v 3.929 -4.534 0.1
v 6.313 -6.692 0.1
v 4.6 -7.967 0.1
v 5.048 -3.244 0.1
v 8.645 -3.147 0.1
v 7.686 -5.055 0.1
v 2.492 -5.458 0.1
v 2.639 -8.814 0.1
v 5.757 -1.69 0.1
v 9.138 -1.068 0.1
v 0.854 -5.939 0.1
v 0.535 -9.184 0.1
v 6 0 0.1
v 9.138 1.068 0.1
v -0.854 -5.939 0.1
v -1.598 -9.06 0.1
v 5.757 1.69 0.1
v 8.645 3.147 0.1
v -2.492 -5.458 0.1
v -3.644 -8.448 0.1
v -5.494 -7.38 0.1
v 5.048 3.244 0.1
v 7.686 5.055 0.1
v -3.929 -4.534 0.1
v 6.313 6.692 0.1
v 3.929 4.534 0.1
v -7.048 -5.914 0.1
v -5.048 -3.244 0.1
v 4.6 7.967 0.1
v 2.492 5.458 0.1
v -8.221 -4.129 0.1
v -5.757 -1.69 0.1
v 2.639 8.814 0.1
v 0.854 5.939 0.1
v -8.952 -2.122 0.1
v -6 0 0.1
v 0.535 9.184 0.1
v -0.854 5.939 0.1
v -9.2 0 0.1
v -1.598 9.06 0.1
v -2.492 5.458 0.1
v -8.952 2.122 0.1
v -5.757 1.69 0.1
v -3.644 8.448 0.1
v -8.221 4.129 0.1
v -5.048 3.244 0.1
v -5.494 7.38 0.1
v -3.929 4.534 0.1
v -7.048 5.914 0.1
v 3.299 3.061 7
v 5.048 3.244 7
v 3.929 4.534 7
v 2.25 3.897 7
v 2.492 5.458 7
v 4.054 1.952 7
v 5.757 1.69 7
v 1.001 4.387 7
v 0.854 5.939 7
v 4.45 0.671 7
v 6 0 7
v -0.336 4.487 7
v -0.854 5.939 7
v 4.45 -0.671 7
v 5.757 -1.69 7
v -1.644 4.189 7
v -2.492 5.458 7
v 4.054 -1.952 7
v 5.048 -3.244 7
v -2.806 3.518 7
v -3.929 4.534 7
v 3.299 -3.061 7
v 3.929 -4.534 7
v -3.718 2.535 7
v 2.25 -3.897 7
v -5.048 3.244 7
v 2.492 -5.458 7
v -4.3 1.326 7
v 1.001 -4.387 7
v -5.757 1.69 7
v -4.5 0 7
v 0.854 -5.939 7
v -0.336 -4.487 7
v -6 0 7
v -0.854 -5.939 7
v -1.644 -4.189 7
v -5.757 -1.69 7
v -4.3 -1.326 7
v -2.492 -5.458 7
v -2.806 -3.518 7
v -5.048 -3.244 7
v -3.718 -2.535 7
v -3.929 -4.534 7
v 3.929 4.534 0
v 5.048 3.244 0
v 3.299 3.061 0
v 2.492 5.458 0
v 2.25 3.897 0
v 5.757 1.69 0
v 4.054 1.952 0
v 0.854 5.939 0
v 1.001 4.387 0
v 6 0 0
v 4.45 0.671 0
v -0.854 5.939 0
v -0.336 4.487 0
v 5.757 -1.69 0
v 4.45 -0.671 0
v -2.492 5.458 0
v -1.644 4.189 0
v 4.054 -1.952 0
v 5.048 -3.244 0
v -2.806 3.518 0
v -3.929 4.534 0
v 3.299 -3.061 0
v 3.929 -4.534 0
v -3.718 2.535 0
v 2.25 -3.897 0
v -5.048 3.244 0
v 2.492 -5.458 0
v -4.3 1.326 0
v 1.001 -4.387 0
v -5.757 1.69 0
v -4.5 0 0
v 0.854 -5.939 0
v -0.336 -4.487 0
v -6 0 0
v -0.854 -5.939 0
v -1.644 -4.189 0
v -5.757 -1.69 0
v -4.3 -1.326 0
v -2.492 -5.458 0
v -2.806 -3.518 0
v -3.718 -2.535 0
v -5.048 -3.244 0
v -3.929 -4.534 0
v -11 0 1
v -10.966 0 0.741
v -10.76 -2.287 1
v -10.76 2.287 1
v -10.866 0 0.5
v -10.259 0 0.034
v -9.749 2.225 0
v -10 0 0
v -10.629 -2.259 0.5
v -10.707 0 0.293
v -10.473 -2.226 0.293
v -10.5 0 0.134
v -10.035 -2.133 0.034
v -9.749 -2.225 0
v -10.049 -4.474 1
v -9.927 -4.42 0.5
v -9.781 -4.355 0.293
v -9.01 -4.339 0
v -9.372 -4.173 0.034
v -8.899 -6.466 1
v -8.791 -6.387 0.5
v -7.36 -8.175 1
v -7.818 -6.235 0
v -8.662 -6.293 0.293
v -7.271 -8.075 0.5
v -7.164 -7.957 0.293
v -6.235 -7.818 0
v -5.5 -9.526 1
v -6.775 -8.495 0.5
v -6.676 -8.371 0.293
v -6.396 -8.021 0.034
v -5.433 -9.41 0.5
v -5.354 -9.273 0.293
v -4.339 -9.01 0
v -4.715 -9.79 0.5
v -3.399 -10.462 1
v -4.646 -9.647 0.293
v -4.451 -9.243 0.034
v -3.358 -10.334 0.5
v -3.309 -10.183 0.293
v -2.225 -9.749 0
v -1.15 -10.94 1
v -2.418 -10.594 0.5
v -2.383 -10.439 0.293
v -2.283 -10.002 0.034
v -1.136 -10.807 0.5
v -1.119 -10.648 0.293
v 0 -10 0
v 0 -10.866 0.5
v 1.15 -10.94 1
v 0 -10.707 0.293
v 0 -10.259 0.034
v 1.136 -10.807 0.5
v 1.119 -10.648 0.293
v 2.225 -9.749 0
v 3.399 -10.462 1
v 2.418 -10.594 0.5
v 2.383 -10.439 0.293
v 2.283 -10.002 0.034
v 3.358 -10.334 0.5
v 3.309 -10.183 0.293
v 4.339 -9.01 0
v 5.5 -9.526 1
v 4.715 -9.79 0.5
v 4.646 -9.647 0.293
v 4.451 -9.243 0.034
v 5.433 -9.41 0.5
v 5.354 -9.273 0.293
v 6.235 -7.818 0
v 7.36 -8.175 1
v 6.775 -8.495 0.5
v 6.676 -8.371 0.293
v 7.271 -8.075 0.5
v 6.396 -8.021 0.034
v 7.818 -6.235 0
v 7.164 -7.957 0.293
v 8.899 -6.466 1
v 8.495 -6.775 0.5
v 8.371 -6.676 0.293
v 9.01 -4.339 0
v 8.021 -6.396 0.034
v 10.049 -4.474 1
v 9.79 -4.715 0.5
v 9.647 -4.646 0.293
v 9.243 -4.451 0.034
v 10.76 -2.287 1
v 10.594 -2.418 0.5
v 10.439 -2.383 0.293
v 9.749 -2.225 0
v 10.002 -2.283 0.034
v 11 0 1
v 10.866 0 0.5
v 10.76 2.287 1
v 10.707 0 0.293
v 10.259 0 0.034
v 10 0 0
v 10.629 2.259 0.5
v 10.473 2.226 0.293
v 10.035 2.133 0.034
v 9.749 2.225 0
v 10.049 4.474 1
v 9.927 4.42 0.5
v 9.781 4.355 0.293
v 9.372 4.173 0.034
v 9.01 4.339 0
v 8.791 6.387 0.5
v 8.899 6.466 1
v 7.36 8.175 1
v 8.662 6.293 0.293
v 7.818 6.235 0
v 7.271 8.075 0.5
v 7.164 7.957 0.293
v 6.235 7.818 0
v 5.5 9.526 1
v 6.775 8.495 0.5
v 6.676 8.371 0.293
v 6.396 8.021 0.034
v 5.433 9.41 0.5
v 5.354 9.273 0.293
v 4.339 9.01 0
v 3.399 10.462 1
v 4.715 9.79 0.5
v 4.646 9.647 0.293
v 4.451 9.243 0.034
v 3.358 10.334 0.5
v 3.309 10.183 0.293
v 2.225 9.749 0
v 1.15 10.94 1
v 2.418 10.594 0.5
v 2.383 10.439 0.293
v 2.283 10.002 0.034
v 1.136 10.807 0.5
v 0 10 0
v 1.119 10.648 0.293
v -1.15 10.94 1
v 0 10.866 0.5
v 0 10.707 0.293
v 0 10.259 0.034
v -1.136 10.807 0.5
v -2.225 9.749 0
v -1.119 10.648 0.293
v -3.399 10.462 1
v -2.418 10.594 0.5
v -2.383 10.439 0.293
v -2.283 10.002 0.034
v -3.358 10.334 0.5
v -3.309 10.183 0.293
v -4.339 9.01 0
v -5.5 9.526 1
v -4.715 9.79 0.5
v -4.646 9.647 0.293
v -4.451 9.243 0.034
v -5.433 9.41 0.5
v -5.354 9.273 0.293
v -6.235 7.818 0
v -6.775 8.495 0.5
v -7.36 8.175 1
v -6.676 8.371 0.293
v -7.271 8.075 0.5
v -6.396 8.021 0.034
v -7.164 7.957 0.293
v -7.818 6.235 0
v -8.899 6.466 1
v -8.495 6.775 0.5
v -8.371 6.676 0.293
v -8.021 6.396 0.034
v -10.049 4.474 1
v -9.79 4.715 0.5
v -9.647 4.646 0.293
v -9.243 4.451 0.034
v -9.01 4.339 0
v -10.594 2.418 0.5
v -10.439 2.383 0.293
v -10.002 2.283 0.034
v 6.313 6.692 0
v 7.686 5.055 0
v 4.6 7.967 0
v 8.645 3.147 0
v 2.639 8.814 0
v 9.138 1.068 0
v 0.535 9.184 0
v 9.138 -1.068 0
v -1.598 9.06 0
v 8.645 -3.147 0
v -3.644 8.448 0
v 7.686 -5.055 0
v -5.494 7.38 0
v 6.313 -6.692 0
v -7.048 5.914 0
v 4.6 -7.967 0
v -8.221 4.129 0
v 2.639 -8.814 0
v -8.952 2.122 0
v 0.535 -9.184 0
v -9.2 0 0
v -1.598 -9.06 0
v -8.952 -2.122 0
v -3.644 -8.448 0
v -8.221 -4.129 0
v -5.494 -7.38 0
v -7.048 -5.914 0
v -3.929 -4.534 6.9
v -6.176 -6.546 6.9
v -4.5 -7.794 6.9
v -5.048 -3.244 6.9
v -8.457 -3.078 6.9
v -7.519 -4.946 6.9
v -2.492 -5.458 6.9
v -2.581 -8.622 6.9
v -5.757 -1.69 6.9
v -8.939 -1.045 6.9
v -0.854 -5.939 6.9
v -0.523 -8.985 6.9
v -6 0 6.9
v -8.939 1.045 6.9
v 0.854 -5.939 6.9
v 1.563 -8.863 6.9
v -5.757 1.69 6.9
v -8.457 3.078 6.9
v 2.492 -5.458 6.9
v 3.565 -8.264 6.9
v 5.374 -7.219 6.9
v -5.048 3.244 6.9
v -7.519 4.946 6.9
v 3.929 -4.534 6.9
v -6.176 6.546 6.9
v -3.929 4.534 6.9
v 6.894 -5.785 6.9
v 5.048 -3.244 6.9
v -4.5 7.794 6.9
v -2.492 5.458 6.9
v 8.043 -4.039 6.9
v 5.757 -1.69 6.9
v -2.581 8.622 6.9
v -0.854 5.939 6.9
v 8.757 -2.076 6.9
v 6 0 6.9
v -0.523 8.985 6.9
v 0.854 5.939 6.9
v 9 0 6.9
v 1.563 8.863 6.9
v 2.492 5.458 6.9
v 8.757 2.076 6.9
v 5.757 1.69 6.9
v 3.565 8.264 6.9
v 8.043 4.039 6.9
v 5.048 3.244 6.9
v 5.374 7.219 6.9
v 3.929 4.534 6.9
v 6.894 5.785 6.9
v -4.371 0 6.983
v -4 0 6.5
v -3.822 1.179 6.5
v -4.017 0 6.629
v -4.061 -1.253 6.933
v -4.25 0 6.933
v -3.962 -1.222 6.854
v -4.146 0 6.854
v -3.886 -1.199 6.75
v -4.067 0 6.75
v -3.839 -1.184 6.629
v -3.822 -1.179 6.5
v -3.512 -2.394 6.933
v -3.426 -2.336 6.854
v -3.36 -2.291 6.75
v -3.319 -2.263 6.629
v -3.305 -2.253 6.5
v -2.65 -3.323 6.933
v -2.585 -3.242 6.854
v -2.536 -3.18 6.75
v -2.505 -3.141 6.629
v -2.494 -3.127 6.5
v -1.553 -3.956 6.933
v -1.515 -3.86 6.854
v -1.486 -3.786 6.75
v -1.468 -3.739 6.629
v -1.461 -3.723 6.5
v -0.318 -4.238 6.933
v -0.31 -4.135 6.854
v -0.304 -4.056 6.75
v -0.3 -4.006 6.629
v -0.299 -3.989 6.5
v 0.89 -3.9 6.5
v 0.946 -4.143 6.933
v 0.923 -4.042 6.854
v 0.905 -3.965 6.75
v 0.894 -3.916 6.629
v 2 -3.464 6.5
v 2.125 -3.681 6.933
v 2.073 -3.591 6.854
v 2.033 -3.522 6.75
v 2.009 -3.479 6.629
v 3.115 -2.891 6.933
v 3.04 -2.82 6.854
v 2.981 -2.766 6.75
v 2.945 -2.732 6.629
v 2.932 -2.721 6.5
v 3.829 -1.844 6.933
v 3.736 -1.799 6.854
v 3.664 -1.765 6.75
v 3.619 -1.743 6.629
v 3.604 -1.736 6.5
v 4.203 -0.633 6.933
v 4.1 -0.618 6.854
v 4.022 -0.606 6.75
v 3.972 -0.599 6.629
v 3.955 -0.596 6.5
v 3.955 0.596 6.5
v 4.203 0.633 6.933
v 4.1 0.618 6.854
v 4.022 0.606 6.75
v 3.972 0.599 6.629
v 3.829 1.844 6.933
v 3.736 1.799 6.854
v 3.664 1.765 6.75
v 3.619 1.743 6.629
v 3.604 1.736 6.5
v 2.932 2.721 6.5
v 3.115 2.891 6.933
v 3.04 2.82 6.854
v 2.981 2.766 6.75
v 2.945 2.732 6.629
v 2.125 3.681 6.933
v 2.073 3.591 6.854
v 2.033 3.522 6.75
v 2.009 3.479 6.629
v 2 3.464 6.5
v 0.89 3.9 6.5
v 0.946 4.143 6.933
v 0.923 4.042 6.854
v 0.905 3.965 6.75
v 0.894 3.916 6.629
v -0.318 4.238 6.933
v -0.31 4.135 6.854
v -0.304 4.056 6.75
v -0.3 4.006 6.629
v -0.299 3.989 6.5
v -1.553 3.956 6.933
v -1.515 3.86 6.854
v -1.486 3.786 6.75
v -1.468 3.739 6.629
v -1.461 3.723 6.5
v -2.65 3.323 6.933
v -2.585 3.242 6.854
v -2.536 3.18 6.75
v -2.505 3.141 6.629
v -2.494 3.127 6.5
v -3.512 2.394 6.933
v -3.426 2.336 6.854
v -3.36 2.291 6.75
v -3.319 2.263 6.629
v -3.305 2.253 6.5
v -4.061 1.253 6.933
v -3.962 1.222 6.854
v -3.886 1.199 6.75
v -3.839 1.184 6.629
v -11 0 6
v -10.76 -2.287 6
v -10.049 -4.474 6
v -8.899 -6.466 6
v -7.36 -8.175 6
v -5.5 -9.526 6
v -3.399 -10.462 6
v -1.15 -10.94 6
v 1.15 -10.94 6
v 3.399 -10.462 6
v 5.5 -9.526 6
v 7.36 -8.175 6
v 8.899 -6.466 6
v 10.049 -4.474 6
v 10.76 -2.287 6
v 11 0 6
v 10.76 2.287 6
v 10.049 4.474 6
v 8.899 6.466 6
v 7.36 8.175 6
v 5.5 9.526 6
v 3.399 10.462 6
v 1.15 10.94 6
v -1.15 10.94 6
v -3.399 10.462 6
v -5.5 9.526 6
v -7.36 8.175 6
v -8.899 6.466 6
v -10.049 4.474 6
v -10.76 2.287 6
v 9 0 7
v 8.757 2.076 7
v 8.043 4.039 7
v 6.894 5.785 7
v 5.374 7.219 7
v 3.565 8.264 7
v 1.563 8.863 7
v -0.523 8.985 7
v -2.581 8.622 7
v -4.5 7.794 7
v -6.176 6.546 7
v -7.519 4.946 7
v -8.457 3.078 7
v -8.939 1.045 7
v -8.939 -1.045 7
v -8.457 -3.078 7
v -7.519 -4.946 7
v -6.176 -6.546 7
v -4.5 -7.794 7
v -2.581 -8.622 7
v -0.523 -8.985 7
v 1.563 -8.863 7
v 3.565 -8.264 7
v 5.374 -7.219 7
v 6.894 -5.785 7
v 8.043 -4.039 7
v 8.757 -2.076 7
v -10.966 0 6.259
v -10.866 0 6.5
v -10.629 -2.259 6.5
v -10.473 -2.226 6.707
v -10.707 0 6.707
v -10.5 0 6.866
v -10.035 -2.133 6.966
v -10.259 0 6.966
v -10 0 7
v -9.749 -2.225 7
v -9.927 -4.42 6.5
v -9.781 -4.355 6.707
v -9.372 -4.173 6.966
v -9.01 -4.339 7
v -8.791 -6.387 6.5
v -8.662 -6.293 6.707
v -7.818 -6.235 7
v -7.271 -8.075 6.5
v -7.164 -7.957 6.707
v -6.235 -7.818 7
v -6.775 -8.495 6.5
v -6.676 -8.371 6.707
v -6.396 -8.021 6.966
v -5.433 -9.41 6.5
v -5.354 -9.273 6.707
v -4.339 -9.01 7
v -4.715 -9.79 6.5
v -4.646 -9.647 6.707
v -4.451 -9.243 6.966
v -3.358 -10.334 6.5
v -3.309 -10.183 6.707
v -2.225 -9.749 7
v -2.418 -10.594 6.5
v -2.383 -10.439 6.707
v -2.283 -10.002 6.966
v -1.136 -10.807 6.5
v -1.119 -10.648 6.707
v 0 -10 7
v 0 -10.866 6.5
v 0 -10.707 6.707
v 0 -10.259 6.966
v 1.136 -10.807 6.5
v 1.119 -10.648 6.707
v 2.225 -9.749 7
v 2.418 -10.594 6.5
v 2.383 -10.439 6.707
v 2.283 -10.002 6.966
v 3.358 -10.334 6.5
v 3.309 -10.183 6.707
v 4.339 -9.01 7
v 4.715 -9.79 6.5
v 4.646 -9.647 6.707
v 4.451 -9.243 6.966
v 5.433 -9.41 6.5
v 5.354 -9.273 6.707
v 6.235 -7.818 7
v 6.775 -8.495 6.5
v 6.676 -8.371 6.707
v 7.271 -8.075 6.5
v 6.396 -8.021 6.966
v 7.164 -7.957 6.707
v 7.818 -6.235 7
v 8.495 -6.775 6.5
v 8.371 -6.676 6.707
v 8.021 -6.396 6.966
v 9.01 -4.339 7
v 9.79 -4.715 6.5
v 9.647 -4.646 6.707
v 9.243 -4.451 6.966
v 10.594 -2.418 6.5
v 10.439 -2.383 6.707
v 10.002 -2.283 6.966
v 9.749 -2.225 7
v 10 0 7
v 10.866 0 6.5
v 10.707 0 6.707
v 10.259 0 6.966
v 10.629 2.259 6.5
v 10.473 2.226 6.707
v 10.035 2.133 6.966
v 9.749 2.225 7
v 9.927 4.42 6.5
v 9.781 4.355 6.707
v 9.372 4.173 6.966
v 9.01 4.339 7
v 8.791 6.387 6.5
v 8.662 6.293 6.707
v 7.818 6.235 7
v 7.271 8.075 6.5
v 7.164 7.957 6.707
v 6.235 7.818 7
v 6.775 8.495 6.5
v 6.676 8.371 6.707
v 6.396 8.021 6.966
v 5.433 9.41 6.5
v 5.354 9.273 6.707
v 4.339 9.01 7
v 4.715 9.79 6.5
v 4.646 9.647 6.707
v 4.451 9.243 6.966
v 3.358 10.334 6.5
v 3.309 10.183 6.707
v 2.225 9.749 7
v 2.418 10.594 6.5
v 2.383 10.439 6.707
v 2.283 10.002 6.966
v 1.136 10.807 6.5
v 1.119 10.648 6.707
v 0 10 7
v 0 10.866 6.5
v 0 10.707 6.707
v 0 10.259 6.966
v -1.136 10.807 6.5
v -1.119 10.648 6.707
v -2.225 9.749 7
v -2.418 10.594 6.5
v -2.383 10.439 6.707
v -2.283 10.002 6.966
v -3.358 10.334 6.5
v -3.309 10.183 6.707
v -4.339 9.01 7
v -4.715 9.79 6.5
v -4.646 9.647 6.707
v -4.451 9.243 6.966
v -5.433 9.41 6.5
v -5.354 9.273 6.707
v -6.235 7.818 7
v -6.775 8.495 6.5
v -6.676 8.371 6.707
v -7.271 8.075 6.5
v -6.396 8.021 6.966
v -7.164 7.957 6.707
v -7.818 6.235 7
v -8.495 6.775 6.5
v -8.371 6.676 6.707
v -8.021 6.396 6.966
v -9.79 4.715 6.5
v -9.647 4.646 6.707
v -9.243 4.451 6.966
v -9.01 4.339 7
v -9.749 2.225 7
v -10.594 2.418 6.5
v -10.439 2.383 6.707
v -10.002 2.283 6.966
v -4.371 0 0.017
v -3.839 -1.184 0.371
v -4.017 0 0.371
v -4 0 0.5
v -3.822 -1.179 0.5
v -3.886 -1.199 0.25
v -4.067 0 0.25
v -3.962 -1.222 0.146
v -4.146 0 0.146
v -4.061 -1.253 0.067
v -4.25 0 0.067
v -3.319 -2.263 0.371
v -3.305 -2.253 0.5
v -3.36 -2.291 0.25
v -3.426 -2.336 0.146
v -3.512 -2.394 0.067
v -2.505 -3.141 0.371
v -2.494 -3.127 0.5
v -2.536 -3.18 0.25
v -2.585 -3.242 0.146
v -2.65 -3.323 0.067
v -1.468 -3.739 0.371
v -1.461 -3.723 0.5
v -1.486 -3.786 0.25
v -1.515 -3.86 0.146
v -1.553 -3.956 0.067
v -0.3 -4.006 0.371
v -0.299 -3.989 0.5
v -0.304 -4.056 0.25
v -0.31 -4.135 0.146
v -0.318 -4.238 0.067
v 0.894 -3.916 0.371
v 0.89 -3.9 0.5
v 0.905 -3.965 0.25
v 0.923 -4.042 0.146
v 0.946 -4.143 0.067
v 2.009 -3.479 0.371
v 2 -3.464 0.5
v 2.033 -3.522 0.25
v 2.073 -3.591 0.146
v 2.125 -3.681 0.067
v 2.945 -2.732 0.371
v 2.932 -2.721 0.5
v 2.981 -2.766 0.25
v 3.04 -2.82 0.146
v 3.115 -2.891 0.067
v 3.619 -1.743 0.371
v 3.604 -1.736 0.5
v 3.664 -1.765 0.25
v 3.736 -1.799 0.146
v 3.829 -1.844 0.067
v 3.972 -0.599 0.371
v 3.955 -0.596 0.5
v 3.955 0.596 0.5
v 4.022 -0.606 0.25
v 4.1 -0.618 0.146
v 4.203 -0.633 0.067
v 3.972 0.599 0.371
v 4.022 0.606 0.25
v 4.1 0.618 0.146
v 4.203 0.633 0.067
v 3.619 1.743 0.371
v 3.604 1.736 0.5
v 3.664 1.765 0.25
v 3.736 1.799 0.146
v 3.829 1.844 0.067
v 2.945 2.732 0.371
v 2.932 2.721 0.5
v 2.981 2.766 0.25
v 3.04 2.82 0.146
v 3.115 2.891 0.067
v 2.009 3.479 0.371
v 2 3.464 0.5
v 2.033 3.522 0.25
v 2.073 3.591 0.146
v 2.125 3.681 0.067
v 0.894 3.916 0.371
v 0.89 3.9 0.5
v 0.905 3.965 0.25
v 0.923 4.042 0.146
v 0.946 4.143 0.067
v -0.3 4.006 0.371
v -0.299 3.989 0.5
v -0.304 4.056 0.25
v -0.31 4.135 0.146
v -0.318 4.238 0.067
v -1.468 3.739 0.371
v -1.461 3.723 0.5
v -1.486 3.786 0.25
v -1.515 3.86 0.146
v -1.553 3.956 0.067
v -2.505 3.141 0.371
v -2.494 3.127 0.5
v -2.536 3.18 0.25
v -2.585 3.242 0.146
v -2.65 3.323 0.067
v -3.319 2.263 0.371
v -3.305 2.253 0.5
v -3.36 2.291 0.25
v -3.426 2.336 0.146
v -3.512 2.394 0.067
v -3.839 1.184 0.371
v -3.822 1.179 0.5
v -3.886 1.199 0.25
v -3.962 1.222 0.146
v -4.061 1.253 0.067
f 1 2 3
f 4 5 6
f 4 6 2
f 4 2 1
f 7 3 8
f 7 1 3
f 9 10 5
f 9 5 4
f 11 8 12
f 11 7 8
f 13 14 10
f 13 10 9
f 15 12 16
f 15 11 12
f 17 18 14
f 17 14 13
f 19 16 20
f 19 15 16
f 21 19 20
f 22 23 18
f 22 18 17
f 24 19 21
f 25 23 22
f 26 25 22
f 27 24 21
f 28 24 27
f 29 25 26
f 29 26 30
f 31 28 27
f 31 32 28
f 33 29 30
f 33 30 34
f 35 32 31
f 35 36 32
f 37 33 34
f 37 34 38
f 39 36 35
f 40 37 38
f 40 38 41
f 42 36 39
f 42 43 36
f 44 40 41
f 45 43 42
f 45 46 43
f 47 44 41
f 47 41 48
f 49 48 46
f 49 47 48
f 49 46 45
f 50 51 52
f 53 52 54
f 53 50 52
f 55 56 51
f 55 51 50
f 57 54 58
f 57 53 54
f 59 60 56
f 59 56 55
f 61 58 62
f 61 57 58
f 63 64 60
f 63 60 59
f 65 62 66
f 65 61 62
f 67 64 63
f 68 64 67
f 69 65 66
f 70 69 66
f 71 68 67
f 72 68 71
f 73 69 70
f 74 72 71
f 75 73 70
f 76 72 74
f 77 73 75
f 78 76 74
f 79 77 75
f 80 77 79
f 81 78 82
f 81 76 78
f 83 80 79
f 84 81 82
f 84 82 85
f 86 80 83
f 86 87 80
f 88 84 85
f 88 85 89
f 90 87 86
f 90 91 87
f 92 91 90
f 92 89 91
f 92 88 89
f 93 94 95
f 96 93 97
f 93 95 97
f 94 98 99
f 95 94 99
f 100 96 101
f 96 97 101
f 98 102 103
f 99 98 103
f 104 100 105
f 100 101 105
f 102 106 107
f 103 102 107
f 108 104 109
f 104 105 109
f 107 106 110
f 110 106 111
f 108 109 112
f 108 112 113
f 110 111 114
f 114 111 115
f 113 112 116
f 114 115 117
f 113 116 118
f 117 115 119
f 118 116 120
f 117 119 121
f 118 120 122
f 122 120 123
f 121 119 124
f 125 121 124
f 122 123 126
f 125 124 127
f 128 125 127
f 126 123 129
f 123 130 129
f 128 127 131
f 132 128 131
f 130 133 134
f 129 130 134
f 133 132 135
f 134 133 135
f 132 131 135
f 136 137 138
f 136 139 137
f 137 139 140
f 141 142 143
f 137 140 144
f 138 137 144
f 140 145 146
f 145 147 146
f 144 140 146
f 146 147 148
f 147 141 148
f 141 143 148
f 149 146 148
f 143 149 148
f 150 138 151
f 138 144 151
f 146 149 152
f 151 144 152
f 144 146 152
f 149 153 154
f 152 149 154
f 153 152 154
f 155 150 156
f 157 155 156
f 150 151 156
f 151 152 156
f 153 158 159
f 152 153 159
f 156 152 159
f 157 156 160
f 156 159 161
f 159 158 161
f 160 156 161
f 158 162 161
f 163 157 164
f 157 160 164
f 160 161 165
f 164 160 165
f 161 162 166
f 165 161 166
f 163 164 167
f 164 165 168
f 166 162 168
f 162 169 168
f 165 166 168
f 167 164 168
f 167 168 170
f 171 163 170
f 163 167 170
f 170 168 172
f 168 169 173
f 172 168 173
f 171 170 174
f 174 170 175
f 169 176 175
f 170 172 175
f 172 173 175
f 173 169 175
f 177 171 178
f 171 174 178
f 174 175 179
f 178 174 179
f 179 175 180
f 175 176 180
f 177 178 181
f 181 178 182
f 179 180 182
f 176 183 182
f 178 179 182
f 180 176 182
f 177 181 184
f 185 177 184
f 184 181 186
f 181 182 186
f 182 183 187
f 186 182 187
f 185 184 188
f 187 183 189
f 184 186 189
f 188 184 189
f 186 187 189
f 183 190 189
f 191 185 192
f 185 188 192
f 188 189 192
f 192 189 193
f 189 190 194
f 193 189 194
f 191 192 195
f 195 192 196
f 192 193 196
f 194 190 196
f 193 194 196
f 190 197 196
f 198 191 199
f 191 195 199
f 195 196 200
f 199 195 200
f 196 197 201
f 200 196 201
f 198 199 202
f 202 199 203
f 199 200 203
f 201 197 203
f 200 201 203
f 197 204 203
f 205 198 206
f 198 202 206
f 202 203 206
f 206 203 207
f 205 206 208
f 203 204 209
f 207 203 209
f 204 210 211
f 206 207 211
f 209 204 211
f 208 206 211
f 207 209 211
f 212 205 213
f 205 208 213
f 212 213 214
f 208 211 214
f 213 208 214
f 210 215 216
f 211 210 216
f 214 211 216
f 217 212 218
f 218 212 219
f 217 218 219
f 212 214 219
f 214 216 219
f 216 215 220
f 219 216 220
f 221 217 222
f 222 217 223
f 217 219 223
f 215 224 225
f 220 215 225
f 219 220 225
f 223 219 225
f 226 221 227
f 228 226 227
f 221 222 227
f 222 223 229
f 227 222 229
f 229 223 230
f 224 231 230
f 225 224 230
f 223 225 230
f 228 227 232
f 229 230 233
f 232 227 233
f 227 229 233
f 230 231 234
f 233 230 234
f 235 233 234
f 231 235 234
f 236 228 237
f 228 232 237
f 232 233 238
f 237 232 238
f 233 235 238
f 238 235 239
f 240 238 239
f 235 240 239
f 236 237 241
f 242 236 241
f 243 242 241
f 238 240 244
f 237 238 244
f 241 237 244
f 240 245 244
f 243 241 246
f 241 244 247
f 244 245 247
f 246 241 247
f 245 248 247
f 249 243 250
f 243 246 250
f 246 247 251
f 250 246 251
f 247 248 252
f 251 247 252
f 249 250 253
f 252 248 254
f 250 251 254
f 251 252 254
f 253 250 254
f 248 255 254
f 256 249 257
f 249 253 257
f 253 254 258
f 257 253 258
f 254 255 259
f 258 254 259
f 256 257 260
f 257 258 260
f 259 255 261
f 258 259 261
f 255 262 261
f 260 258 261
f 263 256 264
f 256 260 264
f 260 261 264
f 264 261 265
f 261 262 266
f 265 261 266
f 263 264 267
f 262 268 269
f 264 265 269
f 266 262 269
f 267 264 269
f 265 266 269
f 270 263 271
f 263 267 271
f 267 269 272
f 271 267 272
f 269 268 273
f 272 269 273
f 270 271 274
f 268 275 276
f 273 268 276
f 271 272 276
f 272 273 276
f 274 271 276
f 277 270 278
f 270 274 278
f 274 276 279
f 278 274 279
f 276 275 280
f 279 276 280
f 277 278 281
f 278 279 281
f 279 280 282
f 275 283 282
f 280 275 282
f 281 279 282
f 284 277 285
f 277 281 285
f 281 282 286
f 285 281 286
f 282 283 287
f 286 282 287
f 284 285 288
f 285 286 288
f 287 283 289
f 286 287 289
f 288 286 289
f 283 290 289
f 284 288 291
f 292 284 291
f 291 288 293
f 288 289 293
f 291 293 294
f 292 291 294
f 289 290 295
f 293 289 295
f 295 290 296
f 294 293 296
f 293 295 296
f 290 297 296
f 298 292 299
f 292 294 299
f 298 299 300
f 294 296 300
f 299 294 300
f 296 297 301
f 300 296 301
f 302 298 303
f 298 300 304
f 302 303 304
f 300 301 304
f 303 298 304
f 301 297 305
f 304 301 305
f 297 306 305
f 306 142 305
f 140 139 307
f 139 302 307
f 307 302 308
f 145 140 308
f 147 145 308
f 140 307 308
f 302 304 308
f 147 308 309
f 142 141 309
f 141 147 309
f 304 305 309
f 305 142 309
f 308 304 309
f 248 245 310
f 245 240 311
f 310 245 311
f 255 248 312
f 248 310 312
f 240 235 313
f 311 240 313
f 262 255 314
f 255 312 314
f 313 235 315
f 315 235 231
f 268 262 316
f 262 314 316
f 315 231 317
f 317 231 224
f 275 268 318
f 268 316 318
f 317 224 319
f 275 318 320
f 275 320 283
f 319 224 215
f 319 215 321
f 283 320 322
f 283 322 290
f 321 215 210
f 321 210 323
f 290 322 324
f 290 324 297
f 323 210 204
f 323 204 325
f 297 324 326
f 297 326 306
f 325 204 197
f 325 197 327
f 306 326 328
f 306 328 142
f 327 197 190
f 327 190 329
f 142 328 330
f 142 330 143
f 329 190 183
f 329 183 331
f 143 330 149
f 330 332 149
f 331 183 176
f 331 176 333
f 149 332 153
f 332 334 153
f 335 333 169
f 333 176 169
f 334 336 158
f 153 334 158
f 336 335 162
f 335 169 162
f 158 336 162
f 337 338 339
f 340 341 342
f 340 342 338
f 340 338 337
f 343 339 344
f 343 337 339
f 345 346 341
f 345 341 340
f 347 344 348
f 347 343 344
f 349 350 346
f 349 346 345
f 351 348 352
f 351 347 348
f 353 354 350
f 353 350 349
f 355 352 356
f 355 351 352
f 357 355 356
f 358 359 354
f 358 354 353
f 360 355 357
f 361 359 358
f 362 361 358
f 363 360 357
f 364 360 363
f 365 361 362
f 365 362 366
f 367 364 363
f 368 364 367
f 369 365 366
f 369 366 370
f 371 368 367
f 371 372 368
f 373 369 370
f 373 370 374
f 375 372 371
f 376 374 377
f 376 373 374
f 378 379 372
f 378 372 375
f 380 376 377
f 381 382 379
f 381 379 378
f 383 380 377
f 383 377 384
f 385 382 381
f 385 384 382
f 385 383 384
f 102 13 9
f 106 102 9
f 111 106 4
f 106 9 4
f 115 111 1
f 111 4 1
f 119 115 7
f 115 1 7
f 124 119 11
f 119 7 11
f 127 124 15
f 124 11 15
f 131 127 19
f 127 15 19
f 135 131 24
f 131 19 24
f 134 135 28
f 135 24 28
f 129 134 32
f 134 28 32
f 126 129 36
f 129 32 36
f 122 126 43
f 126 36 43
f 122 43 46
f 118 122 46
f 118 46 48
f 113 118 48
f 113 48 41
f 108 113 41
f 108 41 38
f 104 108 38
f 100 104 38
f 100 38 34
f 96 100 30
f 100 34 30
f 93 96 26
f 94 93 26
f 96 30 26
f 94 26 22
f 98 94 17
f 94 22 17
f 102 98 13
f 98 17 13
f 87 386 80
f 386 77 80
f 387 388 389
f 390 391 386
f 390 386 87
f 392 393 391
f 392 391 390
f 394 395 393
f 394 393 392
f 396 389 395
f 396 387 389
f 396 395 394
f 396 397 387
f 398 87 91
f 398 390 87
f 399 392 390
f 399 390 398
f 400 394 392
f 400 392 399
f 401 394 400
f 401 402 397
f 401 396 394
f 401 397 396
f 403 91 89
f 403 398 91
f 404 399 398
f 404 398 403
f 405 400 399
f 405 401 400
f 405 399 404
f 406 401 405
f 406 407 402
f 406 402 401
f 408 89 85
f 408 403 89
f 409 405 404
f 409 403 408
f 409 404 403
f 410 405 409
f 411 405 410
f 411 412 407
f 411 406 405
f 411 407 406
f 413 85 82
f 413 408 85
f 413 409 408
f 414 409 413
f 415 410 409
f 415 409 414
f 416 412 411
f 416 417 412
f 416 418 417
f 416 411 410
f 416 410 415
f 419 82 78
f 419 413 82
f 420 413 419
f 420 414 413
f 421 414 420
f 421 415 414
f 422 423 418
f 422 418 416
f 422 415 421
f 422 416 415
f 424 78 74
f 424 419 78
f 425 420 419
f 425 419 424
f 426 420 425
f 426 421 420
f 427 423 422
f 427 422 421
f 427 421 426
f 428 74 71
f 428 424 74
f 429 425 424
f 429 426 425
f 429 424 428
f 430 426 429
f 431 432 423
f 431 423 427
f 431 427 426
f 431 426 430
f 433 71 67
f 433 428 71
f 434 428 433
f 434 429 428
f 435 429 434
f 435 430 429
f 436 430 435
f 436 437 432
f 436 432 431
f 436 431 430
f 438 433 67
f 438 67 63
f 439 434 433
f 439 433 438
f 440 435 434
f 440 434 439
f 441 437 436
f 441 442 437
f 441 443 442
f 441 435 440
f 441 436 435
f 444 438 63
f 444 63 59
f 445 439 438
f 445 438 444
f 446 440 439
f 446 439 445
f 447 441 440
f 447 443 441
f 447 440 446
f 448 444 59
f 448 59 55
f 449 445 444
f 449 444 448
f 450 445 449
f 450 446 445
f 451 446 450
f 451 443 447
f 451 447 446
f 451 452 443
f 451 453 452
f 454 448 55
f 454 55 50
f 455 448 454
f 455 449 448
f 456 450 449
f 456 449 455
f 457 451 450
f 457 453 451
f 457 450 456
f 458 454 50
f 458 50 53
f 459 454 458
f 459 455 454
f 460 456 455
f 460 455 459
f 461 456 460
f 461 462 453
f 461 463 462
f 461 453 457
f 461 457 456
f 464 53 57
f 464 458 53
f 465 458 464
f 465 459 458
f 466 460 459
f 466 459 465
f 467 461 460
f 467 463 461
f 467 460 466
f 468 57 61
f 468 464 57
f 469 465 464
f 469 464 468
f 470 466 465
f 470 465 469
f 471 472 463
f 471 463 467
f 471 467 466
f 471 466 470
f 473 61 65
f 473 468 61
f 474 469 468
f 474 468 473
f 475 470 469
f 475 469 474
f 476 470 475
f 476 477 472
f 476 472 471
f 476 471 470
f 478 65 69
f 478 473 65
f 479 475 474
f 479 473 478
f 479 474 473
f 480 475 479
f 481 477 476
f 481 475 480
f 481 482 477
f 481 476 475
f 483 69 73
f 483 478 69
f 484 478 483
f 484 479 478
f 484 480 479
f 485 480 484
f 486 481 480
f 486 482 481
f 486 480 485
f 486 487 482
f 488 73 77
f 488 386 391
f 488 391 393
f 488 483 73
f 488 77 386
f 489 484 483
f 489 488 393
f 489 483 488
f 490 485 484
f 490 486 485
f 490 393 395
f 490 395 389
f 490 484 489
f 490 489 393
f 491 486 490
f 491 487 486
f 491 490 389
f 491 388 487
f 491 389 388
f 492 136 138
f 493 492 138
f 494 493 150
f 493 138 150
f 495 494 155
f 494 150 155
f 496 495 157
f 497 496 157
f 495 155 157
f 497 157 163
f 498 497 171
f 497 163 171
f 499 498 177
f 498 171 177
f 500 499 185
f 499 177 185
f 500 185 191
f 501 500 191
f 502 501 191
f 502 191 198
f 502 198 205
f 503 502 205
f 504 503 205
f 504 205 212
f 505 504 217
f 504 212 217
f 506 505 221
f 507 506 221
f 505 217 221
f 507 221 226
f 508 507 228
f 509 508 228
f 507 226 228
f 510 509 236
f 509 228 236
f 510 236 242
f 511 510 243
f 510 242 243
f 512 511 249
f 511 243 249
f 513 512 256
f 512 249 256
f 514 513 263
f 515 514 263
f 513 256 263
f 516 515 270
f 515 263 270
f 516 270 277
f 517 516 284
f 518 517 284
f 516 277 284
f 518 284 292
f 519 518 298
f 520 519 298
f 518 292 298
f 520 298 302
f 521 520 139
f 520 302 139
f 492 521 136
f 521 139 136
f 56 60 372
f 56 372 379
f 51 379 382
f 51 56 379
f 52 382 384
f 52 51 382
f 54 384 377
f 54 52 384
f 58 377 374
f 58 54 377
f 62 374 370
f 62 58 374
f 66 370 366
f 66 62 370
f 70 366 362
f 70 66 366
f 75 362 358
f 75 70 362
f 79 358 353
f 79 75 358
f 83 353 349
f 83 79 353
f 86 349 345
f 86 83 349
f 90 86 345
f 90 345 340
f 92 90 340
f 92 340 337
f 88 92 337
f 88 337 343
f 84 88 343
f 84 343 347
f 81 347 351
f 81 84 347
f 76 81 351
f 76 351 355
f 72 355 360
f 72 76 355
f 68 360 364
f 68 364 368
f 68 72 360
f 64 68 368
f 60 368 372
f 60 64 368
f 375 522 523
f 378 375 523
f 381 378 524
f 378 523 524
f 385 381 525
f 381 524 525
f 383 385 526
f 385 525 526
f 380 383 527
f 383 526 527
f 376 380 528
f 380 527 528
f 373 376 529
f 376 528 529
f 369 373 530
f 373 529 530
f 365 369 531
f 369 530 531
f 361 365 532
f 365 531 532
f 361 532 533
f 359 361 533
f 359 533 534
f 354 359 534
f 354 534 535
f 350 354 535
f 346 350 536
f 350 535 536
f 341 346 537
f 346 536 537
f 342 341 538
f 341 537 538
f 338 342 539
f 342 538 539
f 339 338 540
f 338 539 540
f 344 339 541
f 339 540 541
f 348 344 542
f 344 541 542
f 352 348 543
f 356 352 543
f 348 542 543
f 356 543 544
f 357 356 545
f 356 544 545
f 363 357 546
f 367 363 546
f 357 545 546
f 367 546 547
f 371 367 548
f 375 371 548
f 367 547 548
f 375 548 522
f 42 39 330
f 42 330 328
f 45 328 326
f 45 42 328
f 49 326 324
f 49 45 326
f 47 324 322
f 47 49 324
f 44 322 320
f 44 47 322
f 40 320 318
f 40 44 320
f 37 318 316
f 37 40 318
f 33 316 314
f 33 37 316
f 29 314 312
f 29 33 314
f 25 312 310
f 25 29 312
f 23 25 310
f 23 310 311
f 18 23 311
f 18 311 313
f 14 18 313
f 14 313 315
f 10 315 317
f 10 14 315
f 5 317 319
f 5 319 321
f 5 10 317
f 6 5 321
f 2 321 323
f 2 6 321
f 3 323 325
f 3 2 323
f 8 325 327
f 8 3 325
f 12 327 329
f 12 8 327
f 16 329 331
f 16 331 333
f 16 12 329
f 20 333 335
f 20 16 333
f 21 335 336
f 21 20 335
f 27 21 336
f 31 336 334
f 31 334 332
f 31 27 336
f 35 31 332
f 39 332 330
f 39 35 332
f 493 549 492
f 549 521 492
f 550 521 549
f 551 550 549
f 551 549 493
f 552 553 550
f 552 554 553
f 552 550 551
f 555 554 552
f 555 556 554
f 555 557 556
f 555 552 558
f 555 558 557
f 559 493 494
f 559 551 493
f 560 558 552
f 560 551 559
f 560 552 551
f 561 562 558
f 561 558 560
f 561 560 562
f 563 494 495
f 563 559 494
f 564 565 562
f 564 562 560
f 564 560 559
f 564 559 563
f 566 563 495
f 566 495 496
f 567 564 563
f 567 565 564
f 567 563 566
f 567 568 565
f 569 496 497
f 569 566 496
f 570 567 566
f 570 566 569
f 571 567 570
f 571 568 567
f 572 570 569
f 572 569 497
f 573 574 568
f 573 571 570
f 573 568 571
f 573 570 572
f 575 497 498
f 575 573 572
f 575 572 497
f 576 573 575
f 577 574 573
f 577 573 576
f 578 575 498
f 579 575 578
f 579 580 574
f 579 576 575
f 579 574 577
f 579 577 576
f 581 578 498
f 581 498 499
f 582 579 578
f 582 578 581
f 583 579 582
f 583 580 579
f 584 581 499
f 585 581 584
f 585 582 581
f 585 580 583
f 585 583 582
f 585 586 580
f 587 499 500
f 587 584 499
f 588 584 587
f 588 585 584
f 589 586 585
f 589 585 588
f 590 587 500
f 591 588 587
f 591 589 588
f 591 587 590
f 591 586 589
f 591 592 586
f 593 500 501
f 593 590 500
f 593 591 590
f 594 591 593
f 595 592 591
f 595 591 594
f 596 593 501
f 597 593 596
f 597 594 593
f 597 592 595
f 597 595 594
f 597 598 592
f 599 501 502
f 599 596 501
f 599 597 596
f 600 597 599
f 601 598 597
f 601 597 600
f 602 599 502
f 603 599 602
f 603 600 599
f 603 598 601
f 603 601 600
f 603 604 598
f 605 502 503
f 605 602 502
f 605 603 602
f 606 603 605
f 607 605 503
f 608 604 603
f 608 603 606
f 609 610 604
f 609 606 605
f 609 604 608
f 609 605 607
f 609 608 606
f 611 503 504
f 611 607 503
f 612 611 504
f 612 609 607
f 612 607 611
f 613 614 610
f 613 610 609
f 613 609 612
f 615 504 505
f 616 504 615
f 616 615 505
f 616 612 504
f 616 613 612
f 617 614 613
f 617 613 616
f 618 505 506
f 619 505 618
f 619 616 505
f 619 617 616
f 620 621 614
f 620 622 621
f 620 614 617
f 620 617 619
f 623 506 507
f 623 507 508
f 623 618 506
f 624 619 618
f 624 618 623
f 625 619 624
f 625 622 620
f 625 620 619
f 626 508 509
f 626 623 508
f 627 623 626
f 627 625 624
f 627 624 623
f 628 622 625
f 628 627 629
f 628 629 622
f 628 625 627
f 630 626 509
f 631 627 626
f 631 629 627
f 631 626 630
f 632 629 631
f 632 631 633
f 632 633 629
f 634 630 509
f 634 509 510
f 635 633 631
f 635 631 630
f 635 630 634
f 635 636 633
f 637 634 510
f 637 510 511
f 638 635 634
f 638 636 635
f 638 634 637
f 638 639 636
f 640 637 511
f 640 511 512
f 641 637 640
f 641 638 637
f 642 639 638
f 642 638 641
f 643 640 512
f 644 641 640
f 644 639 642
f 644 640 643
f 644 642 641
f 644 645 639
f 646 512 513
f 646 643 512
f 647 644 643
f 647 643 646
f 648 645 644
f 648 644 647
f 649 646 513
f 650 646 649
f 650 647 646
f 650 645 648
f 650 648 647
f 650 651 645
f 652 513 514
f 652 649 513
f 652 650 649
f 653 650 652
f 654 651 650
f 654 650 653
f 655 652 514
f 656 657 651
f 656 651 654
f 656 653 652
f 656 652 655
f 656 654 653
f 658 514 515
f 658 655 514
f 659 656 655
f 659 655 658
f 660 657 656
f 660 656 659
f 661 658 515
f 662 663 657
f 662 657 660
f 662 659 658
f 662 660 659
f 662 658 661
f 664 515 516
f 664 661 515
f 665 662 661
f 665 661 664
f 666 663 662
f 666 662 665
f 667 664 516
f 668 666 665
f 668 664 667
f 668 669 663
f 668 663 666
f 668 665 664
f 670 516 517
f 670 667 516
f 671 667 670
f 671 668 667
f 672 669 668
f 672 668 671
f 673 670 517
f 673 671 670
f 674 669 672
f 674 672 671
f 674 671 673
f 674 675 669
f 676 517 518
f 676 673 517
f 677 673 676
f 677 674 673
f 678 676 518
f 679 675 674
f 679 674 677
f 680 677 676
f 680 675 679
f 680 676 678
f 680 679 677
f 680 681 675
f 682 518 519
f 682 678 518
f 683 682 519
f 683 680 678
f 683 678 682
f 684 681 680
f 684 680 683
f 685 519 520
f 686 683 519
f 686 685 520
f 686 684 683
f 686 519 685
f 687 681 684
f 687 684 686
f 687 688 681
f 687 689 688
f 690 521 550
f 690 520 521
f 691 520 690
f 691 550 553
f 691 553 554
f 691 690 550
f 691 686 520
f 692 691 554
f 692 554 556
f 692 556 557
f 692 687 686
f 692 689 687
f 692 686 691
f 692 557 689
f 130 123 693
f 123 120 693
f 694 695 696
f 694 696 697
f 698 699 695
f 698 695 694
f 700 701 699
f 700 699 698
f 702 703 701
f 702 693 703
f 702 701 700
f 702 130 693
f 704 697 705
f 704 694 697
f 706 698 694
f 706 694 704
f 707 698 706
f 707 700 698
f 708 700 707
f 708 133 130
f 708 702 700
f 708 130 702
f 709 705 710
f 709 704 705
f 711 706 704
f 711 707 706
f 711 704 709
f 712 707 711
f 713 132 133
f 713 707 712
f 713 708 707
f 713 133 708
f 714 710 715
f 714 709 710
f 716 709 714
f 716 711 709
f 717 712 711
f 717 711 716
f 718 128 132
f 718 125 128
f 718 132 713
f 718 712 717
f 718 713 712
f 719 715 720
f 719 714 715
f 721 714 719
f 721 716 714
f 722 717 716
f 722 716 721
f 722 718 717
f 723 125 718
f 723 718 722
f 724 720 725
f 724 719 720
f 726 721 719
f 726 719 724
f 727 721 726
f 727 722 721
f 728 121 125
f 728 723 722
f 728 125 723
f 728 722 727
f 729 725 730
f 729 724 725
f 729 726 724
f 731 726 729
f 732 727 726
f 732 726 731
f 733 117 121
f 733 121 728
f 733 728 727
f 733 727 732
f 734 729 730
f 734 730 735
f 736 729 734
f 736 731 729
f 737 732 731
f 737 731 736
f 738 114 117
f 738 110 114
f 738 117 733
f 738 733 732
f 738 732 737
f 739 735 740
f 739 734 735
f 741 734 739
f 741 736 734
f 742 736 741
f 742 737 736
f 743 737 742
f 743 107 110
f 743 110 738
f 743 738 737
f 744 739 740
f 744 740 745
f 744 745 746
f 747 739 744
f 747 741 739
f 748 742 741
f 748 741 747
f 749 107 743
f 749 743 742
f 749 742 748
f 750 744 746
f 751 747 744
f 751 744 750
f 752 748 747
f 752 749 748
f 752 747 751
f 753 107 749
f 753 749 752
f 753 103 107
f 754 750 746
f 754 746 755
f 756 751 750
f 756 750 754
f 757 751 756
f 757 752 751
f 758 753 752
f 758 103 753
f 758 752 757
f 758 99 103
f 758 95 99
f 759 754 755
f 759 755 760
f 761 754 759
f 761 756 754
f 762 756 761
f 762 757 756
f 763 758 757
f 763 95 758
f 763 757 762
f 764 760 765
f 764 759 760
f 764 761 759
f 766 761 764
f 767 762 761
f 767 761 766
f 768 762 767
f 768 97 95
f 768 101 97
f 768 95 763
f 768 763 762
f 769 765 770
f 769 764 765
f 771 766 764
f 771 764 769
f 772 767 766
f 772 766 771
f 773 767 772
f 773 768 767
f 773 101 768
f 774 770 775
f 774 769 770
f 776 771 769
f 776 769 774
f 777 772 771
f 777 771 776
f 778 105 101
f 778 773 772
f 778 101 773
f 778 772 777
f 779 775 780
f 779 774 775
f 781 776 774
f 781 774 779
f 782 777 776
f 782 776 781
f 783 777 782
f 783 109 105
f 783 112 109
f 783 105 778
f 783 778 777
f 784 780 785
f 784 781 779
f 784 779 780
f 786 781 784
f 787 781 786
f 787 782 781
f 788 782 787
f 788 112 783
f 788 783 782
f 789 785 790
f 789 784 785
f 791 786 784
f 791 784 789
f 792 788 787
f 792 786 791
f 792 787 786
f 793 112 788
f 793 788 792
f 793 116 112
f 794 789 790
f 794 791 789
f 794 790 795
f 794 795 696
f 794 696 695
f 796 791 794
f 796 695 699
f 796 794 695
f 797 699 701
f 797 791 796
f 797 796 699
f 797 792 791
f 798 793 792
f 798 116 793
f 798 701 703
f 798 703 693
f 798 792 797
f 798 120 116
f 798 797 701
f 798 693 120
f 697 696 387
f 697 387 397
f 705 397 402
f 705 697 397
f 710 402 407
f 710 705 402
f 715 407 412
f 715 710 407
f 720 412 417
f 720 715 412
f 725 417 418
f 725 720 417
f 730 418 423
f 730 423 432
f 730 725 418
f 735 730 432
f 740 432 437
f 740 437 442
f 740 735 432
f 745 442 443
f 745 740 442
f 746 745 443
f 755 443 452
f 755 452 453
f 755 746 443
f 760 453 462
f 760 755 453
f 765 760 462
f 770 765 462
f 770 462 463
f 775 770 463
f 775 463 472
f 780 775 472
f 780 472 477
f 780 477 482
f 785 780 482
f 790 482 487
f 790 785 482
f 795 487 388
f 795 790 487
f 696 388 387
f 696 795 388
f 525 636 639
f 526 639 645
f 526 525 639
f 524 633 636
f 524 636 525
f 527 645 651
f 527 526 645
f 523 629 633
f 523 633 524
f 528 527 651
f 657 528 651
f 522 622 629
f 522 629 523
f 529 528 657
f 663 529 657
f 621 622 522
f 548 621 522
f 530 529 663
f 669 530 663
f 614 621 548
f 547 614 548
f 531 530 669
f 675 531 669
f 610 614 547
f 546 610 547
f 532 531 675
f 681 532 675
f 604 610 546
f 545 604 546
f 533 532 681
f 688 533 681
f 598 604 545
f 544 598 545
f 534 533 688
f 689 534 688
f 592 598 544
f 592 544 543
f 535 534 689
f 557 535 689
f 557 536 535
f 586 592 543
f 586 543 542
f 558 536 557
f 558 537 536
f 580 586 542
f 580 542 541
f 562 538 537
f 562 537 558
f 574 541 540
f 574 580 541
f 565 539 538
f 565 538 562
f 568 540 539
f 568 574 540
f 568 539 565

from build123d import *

# Parameters (mm, degrees)
SKETCH1_R           = 11
SKETCH1_R_2         = 4
BOSS_EXTRUDE1_DEPTH = 7
FILLET1_R           = 1
FILLET2_R           = 1
FILLET3_R           = 0.5
FILLET4_R           = 0.5
SKETCH2_R           = 9
SKETCH2_R_2         = 6
CUT_EXTRUDE1_DEPTH  = 0.1
CUT_EXTRUDE2_START  = -0.1
SKETCH3_R           = 9.2
SKETCH3_R_2         = 6
CUT_EXTRUDE2_DEPTH  = 0.1


with BuildPart() as part:
    # Sketch1 → Boss-Extrude1 (new body)
    with BuildSketch(Plane.XY):
        with Locations(Location((0, 0, 0), (0, 0, 180))):
            Circle(SKETCH1_R)
        with Locations(Location((0, 0, 0), (0, 0, 180))):
            Circle(SKETCH1_R_2, mode=Mode.SUBTRACT)
    extrude(amount=BOSS_EXTRUDE1_DEPTH)

    # Fillet1
    fillet1_edges = [part.edges().sort_by_distance(p)[0] for p in [
        (11, 0, 7),
    ]]
    fillet(fillet1_edges, radius=FILLET1_R)

    # Fillet2
    fillet2_edges = [part.edges().sort_by_distance(p)[0] for p in [
        (11, 0, 0),
    ]]
    fillet(fillet2_edges, radius=FILLET2_R)

    # Fillet3
    fillet3_edges = [part.edges().sort_by_distance(p)[0] for p in [
        (4, 0, 7),
    ]]
    fillet(fillet3_edges, radius=FILLET3_R)

    # Fillet4
    fillet4_edges = [part.edges().sort_by_distance(p)[0] for p in [
        (4, 0, 0),
    ]]
    fillet(fillet4_edges, radius=FILLET4_R)

    # Sketch2 → Cut-Extrude1 (cut)
    with BuildSketch(Plane.XY.offset(7)):
        Circle(SKETCH2_R)
        Circle(SKETCH2_R_2, mode=Mode.SUBTRACT)
    extrude(amount=-CUT_EXTRUDE1_DEPTH, mode=Mode.SUBTRACT)

    # Sketch3 → Cut-Extrude2 (cut)
    with BuildSketch(Plane(origin=(0, 0, 0), x_dir=(-1, 0, 0), z_dir=(0, 0, -1)).offset(CUT_EXTRUDE2_START)):
        Circle(SKETCH3_R)
        with Locations(Location((0, 0, 0), (0, 0, 180))):
            Circle(SKETCH3_R_2, mode=Mode.SUBTRACT)
    extrude(amount=CUT_EXTRUDE2_DEPTH, mode=Mode.SUBTRACT)


solid = part.part
